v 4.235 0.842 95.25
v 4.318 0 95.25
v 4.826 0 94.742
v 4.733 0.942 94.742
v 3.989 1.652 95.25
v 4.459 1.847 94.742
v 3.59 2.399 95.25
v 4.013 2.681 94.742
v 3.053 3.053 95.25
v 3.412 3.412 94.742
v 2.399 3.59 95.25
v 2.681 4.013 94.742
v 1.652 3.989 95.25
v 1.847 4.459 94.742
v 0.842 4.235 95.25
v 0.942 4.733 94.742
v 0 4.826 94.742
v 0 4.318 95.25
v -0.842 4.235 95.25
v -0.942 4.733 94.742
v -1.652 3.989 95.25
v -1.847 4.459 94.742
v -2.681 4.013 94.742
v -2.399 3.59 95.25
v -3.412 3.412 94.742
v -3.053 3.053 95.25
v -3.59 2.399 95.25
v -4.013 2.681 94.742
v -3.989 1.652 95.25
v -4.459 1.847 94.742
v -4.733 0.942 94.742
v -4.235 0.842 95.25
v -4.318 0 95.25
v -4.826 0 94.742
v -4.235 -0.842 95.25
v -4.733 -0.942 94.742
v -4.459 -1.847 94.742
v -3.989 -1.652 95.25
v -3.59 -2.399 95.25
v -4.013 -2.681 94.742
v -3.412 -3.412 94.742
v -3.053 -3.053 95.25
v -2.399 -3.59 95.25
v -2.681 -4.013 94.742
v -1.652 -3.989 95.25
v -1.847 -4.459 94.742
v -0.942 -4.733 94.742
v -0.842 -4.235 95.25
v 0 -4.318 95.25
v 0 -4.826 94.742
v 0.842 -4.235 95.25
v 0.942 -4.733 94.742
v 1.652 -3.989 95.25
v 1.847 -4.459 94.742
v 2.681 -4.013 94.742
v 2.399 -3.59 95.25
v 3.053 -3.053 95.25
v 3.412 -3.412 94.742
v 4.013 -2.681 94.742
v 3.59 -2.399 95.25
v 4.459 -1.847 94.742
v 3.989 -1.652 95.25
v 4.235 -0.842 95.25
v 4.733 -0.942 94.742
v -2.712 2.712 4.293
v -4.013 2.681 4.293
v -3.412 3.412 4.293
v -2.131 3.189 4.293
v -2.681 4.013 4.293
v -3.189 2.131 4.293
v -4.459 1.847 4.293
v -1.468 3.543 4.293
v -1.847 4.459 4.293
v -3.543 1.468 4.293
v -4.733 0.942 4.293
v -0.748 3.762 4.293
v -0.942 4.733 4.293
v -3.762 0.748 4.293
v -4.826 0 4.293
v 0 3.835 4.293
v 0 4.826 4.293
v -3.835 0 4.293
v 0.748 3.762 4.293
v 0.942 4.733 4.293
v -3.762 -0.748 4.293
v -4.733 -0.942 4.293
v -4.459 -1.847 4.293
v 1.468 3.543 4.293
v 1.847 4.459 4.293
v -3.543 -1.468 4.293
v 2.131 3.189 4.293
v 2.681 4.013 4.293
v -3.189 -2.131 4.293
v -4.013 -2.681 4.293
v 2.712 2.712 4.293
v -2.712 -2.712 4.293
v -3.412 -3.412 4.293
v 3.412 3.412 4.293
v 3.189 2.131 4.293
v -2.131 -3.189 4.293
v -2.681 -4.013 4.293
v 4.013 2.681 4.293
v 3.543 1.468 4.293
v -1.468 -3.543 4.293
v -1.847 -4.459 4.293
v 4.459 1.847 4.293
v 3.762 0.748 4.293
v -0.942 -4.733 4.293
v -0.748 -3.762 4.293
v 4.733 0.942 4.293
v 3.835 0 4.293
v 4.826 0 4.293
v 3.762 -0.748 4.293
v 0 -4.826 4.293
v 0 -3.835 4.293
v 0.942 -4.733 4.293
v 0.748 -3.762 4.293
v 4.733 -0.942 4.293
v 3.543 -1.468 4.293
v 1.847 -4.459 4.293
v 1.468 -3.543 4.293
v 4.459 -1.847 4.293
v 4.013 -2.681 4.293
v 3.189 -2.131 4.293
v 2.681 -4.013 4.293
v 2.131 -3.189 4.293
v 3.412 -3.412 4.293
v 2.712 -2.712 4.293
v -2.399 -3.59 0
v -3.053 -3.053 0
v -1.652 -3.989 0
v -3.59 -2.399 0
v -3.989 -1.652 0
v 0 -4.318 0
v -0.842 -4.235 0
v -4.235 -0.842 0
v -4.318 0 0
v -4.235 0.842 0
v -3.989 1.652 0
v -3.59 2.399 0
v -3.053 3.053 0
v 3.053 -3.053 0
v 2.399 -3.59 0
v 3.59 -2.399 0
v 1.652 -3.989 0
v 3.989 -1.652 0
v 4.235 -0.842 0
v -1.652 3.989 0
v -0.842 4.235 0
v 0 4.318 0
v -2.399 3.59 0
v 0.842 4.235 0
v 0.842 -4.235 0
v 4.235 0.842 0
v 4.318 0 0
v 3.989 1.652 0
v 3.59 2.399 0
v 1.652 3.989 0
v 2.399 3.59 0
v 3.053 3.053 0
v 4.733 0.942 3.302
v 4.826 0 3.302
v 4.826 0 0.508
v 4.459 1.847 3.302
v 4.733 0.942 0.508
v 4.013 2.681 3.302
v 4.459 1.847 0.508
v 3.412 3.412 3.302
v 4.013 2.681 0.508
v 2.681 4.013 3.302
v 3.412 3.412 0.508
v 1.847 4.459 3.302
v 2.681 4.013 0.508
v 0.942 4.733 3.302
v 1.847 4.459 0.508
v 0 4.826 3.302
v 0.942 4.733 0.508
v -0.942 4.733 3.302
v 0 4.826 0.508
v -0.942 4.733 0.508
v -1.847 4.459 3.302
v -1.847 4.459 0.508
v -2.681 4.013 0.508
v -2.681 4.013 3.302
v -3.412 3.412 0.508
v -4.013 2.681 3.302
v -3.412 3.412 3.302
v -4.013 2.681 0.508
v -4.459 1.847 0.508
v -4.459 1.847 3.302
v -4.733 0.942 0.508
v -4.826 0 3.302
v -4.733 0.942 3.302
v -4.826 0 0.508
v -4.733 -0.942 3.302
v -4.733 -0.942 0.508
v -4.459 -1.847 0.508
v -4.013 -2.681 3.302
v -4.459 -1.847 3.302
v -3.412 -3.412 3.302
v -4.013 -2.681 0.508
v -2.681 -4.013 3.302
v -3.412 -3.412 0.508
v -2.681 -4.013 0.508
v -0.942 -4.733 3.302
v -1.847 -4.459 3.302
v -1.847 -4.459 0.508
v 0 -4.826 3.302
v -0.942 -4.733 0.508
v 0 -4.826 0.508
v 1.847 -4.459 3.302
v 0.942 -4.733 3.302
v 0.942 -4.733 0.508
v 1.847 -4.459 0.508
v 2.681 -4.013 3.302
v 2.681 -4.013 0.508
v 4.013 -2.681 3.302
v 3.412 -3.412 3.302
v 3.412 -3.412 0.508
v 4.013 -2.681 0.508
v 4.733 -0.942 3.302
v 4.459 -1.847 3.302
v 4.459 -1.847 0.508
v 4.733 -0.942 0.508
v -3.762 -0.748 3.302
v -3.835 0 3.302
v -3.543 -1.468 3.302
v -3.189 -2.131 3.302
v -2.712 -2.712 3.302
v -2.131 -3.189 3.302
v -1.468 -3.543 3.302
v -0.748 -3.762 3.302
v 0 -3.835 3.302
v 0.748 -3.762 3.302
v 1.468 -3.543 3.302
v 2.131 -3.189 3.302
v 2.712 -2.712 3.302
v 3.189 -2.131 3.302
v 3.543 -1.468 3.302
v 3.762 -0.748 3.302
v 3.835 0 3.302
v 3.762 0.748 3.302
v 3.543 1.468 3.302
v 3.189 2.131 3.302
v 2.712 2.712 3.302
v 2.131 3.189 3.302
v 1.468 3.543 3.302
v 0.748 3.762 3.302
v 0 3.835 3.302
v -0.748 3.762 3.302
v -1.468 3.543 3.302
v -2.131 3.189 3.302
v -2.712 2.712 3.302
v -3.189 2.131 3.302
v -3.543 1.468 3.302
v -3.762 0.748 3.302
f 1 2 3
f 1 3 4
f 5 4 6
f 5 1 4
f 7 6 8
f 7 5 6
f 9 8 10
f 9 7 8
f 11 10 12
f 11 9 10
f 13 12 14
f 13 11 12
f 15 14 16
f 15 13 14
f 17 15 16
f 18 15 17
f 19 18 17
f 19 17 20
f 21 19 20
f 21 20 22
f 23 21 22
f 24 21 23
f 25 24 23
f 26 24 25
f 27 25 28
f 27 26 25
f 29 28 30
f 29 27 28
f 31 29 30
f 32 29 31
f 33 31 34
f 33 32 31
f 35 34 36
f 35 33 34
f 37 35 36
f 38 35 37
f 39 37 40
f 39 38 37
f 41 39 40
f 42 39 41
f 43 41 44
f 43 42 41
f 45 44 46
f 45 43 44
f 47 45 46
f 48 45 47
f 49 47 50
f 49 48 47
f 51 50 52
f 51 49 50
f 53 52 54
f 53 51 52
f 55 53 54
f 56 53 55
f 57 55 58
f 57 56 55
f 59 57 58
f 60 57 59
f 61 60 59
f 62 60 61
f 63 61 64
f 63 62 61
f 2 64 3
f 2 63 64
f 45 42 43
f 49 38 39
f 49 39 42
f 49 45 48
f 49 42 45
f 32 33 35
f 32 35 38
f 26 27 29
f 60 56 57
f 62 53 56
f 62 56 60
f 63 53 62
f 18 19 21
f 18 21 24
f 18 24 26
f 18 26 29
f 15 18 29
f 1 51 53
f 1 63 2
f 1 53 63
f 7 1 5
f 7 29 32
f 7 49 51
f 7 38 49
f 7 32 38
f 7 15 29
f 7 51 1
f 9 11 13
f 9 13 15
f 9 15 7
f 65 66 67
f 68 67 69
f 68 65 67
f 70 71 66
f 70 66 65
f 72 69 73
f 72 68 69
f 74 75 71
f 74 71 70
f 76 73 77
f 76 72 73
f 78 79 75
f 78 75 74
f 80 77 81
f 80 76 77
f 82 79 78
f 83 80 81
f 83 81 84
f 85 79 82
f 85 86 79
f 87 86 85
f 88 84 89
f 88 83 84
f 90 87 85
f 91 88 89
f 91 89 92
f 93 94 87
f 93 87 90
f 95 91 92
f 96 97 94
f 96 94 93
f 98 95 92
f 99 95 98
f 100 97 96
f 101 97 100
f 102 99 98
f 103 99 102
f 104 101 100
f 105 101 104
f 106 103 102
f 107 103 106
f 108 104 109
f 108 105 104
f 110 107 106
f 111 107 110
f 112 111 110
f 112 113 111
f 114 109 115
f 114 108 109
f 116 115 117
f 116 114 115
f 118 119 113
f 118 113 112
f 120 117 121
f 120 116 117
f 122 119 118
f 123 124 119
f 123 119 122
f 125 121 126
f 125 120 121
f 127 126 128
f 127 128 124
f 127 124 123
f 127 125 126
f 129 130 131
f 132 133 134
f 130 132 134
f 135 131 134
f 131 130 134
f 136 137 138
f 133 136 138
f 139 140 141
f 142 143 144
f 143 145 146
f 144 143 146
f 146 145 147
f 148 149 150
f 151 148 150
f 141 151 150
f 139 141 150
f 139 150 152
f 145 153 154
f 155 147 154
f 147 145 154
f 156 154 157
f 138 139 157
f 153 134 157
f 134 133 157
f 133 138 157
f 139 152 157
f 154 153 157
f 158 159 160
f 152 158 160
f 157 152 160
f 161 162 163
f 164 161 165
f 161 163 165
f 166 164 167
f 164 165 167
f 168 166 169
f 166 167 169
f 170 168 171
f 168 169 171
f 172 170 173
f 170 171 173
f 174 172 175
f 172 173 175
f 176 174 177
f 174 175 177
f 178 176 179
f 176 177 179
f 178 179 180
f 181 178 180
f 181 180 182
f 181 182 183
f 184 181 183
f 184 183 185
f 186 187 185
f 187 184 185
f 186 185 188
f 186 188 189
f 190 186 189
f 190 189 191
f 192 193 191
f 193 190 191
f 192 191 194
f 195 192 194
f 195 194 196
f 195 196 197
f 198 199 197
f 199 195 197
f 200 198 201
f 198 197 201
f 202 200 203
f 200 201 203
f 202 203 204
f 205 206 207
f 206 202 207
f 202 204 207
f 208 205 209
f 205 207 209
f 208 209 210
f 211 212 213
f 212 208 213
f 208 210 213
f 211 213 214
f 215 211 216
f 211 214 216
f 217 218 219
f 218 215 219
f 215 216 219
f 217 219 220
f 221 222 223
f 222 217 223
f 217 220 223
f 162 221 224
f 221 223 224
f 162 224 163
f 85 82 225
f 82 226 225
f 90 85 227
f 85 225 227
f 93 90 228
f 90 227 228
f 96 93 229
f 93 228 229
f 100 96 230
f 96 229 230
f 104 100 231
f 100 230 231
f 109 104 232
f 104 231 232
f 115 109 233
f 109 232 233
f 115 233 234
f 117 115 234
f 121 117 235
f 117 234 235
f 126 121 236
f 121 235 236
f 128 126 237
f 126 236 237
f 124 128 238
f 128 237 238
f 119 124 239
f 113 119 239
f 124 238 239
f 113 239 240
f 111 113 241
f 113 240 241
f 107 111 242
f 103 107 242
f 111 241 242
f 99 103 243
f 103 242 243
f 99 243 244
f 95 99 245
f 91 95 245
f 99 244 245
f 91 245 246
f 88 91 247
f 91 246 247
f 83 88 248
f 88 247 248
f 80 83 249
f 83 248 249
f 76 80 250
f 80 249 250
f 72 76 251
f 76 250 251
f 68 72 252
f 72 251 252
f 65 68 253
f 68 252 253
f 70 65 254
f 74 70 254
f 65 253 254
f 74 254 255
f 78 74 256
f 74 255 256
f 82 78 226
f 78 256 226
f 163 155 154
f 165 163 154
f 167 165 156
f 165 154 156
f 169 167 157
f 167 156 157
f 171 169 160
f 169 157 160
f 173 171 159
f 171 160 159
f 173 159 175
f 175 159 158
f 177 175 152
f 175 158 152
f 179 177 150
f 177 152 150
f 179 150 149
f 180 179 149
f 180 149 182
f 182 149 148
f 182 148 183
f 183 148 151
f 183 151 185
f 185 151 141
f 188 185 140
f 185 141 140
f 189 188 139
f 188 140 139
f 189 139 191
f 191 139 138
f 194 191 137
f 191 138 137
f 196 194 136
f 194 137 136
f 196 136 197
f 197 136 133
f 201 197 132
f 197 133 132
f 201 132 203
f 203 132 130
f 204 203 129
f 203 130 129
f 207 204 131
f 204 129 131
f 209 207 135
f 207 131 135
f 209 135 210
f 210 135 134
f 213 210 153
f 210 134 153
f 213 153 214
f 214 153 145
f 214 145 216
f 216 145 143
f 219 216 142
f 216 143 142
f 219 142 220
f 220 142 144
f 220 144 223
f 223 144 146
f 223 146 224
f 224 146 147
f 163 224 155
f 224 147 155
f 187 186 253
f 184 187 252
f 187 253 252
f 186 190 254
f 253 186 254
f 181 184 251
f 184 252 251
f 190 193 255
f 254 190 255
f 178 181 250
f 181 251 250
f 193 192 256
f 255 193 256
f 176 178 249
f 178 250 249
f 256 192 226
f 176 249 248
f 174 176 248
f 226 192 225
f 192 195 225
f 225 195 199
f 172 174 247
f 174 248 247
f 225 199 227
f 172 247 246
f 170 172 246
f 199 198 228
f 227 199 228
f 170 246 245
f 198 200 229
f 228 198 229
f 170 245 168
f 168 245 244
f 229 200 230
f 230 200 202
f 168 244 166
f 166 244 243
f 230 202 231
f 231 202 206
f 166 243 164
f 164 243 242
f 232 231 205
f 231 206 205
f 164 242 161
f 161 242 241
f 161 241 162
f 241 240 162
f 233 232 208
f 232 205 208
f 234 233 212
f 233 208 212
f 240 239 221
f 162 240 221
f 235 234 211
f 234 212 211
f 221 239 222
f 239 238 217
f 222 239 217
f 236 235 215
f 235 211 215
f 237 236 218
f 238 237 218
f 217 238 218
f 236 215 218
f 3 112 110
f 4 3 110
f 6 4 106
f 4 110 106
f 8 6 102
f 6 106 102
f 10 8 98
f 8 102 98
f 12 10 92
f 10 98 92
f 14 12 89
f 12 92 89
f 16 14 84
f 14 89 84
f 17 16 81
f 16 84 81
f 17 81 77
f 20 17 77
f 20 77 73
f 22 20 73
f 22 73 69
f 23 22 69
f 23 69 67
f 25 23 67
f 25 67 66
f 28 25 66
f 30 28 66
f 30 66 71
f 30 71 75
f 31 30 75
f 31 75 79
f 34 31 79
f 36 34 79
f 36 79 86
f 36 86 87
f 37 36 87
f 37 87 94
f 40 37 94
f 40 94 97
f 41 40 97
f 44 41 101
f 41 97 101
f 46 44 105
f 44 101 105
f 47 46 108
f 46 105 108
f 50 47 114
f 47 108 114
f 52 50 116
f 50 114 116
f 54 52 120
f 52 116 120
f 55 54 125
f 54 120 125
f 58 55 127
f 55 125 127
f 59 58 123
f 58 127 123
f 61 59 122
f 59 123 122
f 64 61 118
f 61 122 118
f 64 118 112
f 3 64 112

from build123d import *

# Parameters (mm, degrees)
SKETCH1_R           = 4.826
BOSS_EXTRUDE1_DEPTH = 95.25
CHAMFER1_SIZE       = 0.508
SKETCH4_W           = 0.9906
SKETCH4_H           = 0.9906


with BuildPart() as part:
    # Sketch1 → Boss-Extrude1 (new body)
    with BuildSketch(Plane.XY):
        Circle(SKETCH1_R)
    extrude(amount=BOSS_EXTRUDE1_DEPTH)

    # Chamfer1
    chamfer1_edges = [part.edges().sort_by_distance(p)[0] for p in [
        (-4.826, 0, 0),
        (-4.826, 0, 95.25),
    ]]
    chamfer(chamfer1_edges, length=CHAMFER1_SIZE)

    # Sketch4 → Cut-Revolve1 (revolve, cut)
    with BuildSketch(Plane(origin=(0, 0, 0), x_dir=(0, 0, -1), z_dir=(1, 0, 0)), mode=Mode.PRIVATE) as cut_revolve1_sk:
        with Locations((-3.7973, 4.3307)):
            Rectangle(SKETCH4_W, SKETCH4_H)
    revolve(cut_revolve1_sk.sketch.rotate(Axis((0, 0, -20.81511258), (0, 0, 1)), 90), axis=Axis((0, 0, -20.81511258), (0, 0, 1)), mode=Mode.SUBTRACT)


solid = part.part
